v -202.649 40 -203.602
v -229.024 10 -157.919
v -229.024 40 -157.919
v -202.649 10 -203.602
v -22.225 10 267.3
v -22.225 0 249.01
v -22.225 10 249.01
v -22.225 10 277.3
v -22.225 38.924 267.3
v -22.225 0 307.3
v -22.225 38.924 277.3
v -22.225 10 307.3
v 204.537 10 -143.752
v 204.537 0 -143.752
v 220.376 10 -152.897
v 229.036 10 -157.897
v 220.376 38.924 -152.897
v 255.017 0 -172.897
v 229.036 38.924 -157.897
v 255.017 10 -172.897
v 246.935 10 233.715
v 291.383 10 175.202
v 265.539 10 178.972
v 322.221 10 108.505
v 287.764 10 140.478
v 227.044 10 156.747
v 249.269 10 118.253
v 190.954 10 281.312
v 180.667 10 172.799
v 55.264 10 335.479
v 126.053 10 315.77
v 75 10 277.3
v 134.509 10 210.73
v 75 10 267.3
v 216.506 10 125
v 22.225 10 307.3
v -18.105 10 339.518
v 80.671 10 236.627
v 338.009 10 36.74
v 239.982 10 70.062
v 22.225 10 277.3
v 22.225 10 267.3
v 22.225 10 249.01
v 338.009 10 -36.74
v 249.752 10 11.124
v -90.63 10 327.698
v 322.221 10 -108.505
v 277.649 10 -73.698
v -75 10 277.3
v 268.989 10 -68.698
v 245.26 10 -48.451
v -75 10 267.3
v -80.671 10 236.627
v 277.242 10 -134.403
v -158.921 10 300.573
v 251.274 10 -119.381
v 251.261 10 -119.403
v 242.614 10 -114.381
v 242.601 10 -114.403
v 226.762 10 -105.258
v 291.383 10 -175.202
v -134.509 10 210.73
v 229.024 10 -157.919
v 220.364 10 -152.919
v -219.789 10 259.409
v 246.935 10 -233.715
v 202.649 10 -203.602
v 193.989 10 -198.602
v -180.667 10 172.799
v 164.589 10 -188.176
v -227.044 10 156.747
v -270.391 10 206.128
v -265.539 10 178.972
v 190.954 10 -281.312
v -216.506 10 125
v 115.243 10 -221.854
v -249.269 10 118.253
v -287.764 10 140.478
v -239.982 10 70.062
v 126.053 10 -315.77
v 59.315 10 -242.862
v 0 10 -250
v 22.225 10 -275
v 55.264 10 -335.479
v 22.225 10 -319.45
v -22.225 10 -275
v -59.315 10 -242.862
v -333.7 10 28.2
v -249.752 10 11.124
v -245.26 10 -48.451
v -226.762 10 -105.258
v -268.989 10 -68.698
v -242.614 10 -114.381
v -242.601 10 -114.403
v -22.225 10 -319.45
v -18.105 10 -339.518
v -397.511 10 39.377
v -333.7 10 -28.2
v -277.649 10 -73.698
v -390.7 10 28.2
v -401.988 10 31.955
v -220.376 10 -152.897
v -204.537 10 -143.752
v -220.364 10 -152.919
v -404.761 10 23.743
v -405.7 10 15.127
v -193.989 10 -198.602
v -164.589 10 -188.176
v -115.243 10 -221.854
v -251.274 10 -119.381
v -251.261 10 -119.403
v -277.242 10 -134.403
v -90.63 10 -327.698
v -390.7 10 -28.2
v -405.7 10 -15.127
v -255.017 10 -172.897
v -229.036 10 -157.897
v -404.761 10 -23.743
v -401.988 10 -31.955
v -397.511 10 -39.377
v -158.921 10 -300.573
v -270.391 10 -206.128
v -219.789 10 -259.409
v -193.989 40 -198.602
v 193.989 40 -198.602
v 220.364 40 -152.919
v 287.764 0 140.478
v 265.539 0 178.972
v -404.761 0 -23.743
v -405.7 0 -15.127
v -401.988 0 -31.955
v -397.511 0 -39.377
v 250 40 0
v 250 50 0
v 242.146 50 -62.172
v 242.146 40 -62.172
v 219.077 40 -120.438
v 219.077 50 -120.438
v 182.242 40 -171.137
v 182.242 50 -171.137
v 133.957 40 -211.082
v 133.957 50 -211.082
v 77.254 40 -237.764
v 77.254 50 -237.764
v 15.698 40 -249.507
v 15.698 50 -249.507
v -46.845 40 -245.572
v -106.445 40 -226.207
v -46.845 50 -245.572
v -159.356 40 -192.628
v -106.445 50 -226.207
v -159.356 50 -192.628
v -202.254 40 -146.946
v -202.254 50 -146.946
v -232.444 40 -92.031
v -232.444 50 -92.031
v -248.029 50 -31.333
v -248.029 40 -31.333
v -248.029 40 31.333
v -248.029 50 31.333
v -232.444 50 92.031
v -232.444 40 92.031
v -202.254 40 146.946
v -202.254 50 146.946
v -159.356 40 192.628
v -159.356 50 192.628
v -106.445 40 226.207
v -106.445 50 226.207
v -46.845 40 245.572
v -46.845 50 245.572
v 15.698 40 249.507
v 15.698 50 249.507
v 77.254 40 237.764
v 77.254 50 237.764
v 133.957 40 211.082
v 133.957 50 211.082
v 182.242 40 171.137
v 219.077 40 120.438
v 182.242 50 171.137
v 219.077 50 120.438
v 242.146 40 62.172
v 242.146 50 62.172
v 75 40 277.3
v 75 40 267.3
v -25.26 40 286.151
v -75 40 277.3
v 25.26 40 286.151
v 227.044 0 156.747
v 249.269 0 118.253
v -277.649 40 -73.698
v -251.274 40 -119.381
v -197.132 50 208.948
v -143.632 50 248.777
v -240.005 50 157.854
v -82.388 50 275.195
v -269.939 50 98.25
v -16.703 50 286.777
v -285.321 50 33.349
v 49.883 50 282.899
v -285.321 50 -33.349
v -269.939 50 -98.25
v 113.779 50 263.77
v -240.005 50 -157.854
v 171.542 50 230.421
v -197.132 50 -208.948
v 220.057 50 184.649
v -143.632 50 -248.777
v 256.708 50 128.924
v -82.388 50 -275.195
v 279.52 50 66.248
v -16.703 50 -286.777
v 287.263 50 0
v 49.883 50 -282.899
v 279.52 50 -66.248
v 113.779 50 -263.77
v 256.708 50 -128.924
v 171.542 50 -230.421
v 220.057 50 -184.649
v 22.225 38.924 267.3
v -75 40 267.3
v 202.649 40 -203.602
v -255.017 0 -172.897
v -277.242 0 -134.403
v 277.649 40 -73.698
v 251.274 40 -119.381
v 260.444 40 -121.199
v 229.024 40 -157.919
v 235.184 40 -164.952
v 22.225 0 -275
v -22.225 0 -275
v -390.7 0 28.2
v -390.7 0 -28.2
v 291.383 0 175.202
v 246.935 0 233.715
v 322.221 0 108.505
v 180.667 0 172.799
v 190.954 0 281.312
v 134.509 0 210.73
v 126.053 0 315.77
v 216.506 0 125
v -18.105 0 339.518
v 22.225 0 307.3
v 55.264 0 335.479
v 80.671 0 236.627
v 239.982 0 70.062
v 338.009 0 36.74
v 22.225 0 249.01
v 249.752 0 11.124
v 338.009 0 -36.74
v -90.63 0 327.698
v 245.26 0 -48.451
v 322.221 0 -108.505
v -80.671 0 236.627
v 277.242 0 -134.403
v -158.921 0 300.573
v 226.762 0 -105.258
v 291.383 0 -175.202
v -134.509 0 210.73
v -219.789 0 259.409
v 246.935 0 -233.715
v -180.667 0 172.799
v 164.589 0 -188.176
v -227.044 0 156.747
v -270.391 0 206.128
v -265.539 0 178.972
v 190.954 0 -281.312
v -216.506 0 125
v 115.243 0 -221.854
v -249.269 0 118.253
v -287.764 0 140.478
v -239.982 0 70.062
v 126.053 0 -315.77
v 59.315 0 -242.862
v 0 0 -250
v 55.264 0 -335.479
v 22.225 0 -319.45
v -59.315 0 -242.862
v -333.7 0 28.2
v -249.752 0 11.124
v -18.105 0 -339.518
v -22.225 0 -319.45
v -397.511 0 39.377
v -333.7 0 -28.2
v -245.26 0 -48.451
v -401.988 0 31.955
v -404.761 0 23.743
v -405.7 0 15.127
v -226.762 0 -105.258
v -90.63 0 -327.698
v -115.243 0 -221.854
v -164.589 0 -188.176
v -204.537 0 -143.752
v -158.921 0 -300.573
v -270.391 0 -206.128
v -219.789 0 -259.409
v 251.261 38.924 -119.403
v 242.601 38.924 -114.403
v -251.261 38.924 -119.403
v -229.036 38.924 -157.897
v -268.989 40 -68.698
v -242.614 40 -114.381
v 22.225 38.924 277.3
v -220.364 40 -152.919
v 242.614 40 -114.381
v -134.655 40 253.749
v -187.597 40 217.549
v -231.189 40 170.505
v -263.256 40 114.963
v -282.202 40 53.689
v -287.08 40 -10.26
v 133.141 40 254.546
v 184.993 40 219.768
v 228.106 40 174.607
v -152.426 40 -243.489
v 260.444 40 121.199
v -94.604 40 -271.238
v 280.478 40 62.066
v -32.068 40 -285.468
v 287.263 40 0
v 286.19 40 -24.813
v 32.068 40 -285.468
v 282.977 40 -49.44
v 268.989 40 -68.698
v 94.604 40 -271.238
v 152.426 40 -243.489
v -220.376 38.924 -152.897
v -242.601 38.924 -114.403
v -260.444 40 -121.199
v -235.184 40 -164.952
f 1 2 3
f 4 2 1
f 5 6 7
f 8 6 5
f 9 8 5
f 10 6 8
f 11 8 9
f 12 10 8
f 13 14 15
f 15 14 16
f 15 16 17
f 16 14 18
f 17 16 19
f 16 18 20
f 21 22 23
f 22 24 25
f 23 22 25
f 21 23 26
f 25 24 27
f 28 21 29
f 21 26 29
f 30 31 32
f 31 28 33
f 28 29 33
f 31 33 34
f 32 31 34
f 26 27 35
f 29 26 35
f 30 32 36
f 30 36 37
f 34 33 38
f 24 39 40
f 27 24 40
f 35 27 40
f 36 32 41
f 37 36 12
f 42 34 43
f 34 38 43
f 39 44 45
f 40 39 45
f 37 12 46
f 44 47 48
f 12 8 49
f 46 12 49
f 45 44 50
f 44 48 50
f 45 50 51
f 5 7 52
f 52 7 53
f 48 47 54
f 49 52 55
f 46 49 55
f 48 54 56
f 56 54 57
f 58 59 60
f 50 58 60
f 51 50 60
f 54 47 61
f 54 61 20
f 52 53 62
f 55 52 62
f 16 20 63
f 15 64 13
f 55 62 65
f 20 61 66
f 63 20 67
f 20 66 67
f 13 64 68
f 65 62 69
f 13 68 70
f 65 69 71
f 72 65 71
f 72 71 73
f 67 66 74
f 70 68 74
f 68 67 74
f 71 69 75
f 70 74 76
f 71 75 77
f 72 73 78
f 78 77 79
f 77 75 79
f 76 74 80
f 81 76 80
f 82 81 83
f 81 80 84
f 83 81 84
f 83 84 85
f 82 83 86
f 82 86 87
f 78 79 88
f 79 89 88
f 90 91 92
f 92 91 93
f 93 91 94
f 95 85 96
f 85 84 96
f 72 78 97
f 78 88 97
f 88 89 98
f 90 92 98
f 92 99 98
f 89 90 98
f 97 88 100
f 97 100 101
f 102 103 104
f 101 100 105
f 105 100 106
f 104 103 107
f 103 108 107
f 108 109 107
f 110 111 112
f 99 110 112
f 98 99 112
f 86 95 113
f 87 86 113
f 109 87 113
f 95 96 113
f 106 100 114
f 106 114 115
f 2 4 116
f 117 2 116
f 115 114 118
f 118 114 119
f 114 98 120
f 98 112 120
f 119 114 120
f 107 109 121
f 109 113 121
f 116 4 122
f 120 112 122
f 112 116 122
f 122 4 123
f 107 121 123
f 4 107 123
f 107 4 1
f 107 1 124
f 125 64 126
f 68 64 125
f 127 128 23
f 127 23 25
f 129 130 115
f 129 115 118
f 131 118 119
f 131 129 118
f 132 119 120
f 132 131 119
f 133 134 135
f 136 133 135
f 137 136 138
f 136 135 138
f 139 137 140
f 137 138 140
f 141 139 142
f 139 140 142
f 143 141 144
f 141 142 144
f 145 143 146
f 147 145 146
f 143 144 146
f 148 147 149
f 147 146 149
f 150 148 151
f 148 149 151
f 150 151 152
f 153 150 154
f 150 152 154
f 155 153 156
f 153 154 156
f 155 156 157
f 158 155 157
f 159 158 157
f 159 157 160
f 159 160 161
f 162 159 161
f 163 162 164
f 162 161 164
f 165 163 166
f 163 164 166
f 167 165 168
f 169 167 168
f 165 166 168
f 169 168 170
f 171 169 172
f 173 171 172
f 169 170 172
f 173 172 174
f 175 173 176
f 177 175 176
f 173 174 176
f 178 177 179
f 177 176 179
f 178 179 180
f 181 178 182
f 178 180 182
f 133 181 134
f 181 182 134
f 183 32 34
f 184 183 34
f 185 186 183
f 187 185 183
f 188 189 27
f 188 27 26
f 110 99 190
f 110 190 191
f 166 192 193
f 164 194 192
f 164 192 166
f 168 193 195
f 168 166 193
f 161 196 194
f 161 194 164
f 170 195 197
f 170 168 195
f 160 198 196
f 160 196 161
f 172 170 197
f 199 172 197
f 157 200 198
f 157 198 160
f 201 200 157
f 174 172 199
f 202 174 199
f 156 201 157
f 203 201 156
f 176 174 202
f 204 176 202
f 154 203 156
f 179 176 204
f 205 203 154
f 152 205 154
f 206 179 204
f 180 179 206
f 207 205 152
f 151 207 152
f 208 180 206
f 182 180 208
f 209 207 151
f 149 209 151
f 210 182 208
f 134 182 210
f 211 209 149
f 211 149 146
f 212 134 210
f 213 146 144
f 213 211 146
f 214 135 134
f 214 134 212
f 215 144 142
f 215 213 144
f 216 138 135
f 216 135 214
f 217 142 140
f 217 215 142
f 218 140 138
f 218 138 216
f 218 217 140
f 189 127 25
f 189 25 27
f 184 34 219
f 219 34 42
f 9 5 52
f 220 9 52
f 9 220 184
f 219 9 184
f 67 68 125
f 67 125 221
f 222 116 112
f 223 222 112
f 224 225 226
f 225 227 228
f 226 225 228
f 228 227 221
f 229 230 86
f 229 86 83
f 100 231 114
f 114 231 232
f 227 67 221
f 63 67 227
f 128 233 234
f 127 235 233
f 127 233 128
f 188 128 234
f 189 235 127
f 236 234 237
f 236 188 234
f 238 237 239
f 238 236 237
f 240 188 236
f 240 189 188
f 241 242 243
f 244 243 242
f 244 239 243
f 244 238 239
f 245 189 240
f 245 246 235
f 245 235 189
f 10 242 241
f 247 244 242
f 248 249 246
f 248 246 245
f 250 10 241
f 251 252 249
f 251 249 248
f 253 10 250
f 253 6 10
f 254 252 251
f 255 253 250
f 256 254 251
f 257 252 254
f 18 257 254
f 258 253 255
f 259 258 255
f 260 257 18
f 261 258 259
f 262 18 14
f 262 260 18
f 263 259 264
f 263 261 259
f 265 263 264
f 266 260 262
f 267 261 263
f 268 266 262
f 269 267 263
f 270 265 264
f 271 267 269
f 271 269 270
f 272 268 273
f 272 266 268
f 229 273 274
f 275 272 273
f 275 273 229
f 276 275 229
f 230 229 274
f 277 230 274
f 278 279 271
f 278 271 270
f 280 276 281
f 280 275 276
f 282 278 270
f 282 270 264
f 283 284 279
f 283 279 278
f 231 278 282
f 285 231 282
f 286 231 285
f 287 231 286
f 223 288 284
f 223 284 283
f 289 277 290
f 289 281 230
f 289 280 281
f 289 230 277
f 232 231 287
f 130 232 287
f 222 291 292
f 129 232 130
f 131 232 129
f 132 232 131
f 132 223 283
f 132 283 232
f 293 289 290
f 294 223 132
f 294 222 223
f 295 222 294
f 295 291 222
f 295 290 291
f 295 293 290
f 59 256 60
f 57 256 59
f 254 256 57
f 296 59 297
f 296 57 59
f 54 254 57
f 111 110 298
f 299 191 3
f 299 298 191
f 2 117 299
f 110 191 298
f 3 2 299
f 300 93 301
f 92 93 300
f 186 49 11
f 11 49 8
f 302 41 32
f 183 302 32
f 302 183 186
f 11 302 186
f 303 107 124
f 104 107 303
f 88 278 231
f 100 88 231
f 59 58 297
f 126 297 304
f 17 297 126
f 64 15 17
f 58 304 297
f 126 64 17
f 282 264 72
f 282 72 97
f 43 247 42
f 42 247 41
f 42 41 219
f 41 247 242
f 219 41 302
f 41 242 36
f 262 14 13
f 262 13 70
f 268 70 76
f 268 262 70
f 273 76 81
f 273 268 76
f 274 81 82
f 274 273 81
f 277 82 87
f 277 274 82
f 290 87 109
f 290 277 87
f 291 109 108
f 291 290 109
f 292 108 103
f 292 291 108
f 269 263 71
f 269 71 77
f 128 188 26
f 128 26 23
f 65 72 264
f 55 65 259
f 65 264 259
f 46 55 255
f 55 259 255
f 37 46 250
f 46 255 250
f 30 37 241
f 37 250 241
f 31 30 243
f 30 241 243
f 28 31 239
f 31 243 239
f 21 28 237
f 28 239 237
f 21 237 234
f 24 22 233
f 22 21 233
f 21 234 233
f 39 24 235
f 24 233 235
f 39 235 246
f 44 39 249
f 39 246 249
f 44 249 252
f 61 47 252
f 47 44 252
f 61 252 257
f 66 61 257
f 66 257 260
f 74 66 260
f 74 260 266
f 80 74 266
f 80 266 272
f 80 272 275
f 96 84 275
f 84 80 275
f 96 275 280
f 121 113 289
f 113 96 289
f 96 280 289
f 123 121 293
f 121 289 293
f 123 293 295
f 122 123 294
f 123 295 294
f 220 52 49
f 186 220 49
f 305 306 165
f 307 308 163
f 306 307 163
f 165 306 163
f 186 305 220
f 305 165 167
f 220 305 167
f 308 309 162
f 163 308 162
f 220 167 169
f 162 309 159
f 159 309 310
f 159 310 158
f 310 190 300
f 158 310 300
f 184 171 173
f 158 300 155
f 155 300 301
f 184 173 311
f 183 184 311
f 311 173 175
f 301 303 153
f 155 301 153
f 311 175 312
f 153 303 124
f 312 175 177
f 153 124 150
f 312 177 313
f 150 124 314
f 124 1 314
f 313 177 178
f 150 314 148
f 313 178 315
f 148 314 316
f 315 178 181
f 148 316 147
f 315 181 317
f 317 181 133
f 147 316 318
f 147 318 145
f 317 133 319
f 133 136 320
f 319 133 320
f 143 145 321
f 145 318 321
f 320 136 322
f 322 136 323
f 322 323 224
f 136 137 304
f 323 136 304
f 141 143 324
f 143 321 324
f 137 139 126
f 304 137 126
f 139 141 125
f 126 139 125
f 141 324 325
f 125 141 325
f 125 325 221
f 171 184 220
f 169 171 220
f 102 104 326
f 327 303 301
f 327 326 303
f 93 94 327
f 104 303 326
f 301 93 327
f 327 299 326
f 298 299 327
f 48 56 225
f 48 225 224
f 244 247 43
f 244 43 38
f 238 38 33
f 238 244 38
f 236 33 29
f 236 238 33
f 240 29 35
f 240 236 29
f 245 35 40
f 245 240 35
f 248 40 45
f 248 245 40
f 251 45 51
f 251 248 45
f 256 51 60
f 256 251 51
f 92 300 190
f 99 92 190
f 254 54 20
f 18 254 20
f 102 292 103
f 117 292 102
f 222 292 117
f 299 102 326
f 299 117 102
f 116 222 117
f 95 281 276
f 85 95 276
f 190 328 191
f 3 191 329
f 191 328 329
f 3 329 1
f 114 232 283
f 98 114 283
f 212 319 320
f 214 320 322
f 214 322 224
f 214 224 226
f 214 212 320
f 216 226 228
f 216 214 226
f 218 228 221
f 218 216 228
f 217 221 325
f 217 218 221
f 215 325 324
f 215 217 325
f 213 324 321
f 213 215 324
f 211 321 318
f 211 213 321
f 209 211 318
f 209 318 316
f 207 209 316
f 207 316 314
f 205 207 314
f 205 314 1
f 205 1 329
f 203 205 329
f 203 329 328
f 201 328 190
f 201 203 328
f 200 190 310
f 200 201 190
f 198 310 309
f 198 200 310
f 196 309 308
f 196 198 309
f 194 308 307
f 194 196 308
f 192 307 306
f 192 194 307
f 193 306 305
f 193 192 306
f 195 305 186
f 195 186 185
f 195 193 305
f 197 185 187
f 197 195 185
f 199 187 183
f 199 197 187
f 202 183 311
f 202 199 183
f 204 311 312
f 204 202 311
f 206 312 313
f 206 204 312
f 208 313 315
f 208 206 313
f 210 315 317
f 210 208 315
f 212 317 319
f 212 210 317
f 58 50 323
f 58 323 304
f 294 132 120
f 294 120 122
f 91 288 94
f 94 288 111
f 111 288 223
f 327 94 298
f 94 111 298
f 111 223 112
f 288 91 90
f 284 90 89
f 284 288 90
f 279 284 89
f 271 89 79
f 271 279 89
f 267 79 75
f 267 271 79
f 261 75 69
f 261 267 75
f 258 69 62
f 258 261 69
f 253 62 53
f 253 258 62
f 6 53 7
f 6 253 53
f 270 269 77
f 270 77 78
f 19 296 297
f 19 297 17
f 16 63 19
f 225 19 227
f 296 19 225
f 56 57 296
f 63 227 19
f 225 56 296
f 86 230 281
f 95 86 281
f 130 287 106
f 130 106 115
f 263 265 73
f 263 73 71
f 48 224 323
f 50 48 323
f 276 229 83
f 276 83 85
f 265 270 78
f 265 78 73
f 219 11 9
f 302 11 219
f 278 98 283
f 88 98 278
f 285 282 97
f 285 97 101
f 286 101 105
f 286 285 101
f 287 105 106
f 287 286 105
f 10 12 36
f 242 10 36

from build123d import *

# Parameters (mm, degrees)
SKETCH1_R           = 340
SKETCH1_R_2         = 250
SKETCH1_W           = 44.45
SKETCH1_H           = 44.45
BOSS_EXTRUDE1_DEPTH = 10
BOSS_EXTRUDE2_DEPTH = 40
SKETCH3_W           = 44.45
SKETCH3_H           = 44.45
CUT_EXTRUDE1_DEPTH  = 30
CIRPATTERN1_COUNT   = 3
BOSS_EXTRUDE3_START = -10
SKETCH4_R           = 287.263450512
SKETCH4_R_2         = 250
BOSS_EXTRUDE3_DEPTH = 10
BOSS_EXTRUDE4_DEPTH = 10
SKETCH6_W           = 57
SKETCH6_H           = 56.4
CUT_EXTRUDE2_DEPTH  = 10


with BuildPart() as part:
    # Sketch1 → Boss-Extrude1 (new body)
    with BuildSketch(Plane(origin=(0, 0, 0), x_dir=(1, 0, 0), z_dir=(0, 1, 0))):
        Circle(SKETCH1_R)
        Circle(SKETCH1_R_2, mode=Mode.SUBTRACT)
        with Locations((0, 297.225)):
            Rectangle(SKETCH1_W, SKETCH1_H, mode=Mode.SUBTRACT)
        Polygon((287.764315239, -140.477585401), (249.269486041, -118.252585401), (227.044486041, -156.747414599), (265.539315239, -178.972414599), align=None, mode=Mode.SUBTRACT)
        Polygon((-265.539315239, -178.972414599), (-227.044486041, -156.747414599), (-249.269486041, -118.252585401), (-287.764315239, -140.477585401), align=None, mode=Mode.SUBTRACT)
    extrude(amount=BOSS_EXTRUDE1_DEPTH)

    # Sketch2 → Boss-Extrude2 (add)
    with BuildSketch(Plane(origin=(0, 10, 0), x_dir=(1, 0, 0), z_dir=(0, 1, 0))):
        Polygon((22.25, -267.3), (-22.25, -267.3), (-75, -267.3), (-75, -277.3), (-22.25, -277.3), (22.25, -277.3), (75, -277.3), (75, -267.3), align=None)
        Polygon((-229.023844469, 157.919065234), (-202.648844469, 203.601905284), (-193.988590432, 198.601905284), (-220.363590432, 152.919065234), (-242.613590432, 114.380934766), (-268.988590432, 68.698094716), (-277.648844469, 73.698094716), (-251.273844469, 119.380934766), align=None)
        Polygon((251.273844469, 119.380934766), (277.648844469, 73.698094716), (268.988590432, 68.698094716), (242.613590432, 114.380934766), (220.363590432, 152.919065234), (193.988590432, 198.601905284), (202.648844469, 203.601905284), (229.023844469, 157.919065234), align=None)
    extrude(amount=BOSS_EXTRUDE2_DEPTH)

    # Sketch3 → Cut-Extrude1 (cut, symmetric)
    with BuildSketch(Plane.XY.offset(277.3)):
        with Locations((0, 16.699086593)):
            Rectangle(SKETCH3_W, SKETCH3_H)
    cut_extrude1 = extrude(amount=CUT_EXTRUDE1_DEPTH, both=True, mode=Mode.SUBTRACT)

    # CirPattern1: Cut-Extrude1 ×3 about axis
    cirpattern1_axis = Axis((0, 52.77629567, 0), (0, -1, 0))
    for i in range(1, CIRPATTERN1_COUNT):
        add(cut_extrude1.rotate(cirpattern1_axis, i * 360 / CIRPATTERN1_COUNT), mode=Mode.SUBTRACT)

    # Sketch4 → Boss-Extrude3 (add)
    with BuildSketch(Plane(origin=(0, 50, 0), x_dir=(1, 0, 0), z_dir=(0, 1, 0)).offset(BOSS_EXTRUDE3_START)):
        Circle(SKETCH4_R)
        Circle(SKETCH4_R_2, mode=Mode.SUBTRACT)
    extrude(amount=BOSS_EXTRUDE3_DEPTH)

    # Sketch5 → Boss-Extrude4 (add)
    with BuildSketch(Plane(origin=(0, 0, 0), x_dir=(1, 0, 0), z_dir=(0, 1, 0))):
        with BuildLine():
            Line((-397.510704876, 39.376941903), (-270.390991444, 206.127901425))
            Line((-270.390991444, 206.127901425), (-330.879136225, 0))
            Line((-330.879136225, 0), (-270.390991444, -206.127901425))
            Line((-270.390991444, -206.127901425), (-397.510704876, -39.376941903))
            ThreePointArc((-397.510704876, -39.376941903), (-403.597415446, -27.924487201), (-405.7, -15.126600559))
            Line((-405.7, -15.126600559), (-405.7, 15.126600559))
            ThreePointArc((-405.7, 15.126600559), (-403.597415446, 27.924487201), (-397.510704876, 39.376941903))
        make_face()
        Polygon((-390.7, 0), (-390.7, 28.2), (-333.7, 28.2), (-333.7, -28.2), (-390.7, -28.2), align=None, mode=Mode.SUBTRACT)
    extrude(amount=BOSS_EXTRUDE4_DEPTH)

    # Sketch6 → Cut-Extrude2 (cut)
    with BuildSketch(Plane(origin=(0, 10, 0), x_dir=(-1, 0, 0), z_dir=(0, 1, 0))):
        with Locations((362.2, 0)):
            Rectangle(SKETCH6_W, SKETCH6_H)
    extrude(amount=-CUT_EXTRUDE2_DEPTH, mode=Mode.SUBTRACT)


solid = part.part
